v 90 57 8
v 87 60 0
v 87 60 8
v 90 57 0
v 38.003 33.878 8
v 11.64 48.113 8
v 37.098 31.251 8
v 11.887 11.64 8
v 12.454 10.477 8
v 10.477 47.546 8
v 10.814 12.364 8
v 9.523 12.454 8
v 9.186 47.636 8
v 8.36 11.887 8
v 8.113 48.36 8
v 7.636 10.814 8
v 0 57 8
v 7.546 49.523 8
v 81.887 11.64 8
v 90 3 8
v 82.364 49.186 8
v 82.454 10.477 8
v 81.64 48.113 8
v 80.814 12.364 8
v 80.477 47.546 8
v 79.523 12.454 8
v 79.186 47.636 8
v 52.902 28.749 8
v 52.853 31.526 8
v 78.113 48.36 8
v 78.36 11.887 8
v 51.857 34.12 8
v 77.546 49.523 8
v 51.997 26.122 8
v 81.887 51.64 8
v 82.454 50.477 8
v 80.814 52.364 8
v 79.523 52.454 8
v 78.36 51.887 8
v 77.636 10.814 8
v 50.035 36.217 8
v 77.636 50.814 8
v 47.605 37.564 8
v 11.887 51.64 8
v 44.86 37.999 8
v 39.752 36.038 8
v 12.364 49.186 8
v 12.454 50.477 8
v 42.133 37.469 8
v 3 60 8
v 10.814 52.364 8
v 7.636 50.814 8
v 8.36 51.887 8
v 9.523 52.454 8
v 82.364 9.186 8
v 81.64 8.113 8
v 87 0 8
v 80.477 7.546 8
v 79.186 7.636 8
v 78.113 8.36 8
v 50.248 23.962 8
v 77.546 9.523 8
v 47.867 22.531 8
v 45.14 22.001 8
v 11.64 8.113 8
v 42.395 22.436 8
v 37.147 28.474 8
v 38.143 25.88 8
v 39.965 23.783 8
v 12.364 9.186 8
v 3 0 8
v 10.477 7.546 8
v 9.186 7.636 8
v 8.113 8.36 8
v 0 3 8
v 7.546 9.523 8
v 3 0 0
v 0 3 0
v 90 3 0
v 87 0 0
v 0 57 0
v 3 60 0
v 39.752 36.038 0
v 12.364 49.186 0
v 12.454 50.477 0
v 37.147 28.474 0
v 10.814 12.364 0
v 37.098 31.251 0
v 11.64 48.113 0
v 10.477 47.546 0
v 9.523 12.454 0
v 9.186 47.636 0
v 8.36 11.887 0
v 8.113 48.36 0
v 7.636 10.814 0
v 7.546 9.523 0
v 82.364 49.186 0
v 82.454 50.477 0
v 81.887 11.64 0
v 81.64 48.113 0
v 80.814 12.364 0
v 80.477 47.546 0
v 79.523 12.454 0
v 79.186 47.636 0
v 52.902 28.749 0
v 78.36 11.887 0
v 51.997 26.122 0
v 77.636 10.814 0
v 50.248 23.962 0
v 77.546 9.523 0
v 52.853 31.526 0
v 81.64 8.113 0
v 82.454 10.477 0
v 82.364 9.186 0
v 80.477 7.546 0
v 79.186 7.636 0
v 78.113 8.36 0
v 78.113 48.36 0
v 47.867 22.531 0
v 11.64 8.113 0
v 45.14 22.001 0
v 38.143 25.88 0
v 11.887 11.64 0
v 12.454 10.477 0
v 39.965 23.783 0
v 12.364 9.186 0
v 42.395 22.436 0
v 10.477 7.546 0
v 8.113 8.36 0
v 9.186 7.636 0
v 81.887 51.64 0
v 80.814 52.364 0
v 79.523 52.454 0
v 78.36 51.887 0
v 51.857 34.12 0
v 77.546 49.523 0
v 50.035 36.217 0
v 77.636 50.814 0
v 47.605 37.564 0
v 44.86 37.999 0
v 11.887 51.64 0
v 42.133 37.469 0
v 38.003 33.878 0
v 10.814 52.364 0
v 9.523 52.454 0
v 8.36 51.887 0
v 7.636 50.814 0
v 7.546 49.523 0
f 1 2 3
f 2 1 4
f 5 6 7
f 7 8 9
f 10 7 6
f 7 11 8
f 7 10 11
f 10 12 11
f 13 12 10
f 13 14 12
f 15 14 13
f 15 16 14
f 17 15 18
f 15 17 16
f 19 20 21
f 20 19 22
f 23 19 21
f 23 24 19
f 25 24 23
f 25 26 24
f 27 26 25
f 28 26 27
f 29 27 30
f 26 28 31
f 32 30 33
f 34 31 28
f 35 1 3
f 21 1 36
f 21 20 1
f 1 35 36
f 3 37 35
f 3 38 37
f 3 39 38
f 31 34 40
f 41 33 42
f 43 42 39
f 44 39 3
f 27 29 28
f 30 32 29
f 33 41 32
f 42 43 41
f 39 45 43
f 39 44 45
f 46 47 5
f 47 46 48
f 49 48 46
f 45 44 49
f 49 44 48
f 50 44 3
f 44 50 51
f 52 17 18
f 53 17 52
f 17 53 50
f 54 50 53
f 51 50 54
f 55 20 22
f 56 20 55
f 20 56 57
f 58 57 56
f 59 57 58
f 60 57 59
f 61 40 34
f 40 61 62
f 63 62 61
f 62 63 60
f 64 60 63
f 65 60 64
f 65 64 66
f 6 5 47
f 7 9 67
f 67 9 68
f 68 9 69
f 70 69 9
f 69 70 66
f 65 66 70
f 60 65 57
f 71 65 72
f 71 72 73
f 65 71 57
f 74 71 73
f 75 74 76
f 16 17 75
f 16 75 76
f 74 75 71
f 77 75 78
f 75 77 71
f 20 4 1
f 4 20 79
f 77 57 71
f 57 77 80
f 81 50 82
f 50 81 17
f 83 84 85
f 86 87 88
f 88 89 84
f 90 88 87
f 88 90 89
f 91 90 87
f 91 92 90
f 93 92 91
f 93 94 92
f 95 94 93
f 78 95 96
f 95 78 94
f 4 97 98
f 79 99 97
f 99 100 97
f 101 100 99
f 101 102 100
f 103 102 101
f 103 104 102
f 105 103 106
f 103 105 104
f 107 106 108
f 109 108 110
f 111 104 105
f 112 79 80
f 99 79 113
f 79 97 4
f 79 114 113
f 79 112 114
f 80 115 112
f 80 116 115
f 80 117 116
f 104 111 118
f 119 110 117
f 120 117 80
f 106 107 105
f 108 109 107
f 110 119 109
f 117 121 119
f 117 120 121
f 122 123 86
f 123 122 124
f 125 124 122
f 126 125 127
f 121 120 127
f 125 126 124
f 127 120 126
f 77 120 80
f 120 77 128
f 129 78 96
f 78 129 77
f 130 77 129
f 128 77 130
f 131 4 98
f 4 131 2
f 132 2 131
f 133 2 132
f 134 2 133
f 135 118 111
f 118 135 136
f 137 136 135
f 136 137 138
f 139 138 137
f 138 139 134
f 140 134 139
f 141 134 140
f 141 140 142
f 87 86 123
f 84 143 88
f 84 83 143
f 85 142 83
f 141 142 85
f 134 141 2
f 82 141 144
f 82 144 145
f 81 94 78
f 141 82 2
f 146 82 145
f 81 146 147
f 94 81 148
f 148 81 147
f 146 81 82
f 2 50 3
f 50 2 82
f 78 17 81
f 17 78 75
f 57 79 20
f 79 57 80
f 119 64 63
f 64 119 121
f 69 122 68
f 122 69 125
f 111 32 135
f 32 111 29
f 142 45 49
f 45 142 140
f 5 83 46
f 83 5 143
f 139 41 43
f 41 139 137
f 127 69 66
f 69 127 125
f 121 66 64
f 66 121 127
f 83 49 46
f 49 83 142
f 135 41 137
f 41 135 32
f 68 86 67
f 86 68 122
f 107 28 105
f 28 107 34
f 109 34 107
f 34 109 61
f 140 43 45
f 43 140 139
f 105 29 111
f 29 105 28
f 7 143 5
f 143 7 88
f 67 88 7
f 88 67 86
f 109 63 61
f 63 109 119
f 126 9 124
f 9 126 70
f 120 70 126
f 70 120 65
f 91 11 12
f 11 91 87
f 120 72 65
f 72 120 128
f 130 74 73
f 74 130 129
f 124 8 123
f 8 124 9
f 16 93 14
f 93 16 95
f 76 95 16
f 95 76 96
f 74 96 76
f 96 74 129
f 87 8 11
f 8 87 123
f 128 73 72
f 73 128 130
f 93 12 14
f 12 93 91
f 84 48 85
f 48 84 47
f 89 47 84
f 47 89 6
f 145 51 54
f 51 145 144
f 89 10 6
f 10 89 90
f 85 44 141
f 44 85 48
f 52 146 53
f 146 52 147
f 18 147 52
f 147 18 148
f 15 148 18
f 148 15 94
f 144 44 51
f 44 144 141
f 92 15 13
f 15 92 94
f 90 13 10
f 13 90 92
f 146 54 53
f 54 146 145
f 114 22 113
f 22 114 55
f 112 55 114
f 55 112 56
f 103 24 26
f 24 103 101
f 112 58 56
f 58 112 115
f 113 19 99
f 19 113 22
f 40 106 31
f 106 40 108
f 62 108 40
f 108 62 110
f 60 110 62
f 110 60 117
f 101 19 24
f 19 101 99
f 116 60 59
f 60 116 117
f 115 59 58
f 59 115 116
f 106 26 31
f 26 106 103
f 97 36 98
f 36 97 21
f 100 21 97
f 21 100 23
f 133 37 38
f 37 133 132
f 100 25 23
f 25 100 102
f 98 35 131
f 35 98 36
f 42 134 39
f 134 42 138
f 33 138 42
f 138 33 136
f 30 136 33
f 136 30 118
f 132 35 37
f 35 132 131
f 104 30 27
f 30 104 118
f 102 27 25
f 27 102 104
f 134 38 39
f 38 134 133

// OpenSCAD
$fn = 32;

// ----------------------------------------------------------------------
// Spacer plate: rect 90 x 60
// ----------------------------------------------------------------------

// --- parameters (mm) ---
bore_r = 8;               // centre bore radius
bolt_r = 2.5;             // bolt hole radius
plate_t = 8;              // plate thickness, Z (extrusion height)
plate_l = 90;             // plate length, X
plate_w = 60;             // plate width, Y
inset = 10;               // corner hole inset

profile = [[3, 0], [87, 0], [90, 3], [90, 57], [87, 60], [3, 60], [0, 57], [0, 3]];  // primary outline, 8 points, counter clockwise
void_1 = [[52.853, 31.526], [51.857, 34.12], [50.035, 36.217], [47.605, 37.564], [44.86, 37.999], [42.133, 37.469], [39.752, 36.038], [38.003, 33.878], [37.098, 31.251], [37.147, 28.474], [38.143, 25.88], [39.965, 23.783], [42.395, 22.436], [45.14, 22.001], [47.867, 22.531], [50.248, 23.962], [51.997, 26.122], [52.902, 28.749]];  // centre bore, 18 points
void_2 = [[12.454, 10.477], [11.887, 11.64], [10.814, 12.364], [9.523, 12.454], [8.36, 11.887], [7.636, 10.814], [7.546, 9.523], [8.113, 8.36], [9.186, 7.636], [10.477, 7.546], [11.64, 8.113], [12.364, 9.186]];  // corner hole, 12 points
void_3 = [[12.454, 50.477], [11.887, 51.64], [10.814, 52.364], [9.523, 52.454], [8.36, 51.887], [7.636, 50.814], [7.546, 49.523], [8.113, 48.36], [9.186, 47.636], [10.477, 47.546], [11.64, 48.113], [12.364, 49.186]];  // corner hole, 12 points
void_4 = [[82.454, 10.477], [81.887, 11.64], [80.814, 12.364], [79.523, 12.454], [78.36, 11.887], [77.636, 10.814], [77.546, 9.523], [78.113, 8.36], [79.186, 7.636], [80.477, 7.546], [81.64, 8.113], [82.364, 9.186]];  // corner hole, 12 points
void_5 = [[82.454, 50.477], [81.887, 51.64], [80.814, 52.364], [79.523, 52.454], [78.36, 51.887], [77.636, 50.814], [77.546, 49.523], [78.113, 48.36], [79.186, 47.636], [80.477, 47.546], [81.64, 48.113], [82.364, 49.186]];  // corner hole, 12 points

// --- the one profile operation ---
difference() {
  linear_extrude(height = plate_t) polygon(points = profile);
  translate([0, 0, -1])
    linear_extrude(height = plate_t + 2) polygon(points = void_1);
  translate([0, 0, -1])
    linear_extrude(height = plate_t + 2) polygon(points = void_2);
  translate([0, 0, -1])
    linear_extrude(height = plate_t + 2) polygon(points = void_3);
  translate([0, 0, -1])
    linear_extrude(height = plate_t + 2) polygon(points = void_4);
  translate([0, 0, -1])
    linear_extrude(height = plate_t + 2) polygon(points = void_5);
}
